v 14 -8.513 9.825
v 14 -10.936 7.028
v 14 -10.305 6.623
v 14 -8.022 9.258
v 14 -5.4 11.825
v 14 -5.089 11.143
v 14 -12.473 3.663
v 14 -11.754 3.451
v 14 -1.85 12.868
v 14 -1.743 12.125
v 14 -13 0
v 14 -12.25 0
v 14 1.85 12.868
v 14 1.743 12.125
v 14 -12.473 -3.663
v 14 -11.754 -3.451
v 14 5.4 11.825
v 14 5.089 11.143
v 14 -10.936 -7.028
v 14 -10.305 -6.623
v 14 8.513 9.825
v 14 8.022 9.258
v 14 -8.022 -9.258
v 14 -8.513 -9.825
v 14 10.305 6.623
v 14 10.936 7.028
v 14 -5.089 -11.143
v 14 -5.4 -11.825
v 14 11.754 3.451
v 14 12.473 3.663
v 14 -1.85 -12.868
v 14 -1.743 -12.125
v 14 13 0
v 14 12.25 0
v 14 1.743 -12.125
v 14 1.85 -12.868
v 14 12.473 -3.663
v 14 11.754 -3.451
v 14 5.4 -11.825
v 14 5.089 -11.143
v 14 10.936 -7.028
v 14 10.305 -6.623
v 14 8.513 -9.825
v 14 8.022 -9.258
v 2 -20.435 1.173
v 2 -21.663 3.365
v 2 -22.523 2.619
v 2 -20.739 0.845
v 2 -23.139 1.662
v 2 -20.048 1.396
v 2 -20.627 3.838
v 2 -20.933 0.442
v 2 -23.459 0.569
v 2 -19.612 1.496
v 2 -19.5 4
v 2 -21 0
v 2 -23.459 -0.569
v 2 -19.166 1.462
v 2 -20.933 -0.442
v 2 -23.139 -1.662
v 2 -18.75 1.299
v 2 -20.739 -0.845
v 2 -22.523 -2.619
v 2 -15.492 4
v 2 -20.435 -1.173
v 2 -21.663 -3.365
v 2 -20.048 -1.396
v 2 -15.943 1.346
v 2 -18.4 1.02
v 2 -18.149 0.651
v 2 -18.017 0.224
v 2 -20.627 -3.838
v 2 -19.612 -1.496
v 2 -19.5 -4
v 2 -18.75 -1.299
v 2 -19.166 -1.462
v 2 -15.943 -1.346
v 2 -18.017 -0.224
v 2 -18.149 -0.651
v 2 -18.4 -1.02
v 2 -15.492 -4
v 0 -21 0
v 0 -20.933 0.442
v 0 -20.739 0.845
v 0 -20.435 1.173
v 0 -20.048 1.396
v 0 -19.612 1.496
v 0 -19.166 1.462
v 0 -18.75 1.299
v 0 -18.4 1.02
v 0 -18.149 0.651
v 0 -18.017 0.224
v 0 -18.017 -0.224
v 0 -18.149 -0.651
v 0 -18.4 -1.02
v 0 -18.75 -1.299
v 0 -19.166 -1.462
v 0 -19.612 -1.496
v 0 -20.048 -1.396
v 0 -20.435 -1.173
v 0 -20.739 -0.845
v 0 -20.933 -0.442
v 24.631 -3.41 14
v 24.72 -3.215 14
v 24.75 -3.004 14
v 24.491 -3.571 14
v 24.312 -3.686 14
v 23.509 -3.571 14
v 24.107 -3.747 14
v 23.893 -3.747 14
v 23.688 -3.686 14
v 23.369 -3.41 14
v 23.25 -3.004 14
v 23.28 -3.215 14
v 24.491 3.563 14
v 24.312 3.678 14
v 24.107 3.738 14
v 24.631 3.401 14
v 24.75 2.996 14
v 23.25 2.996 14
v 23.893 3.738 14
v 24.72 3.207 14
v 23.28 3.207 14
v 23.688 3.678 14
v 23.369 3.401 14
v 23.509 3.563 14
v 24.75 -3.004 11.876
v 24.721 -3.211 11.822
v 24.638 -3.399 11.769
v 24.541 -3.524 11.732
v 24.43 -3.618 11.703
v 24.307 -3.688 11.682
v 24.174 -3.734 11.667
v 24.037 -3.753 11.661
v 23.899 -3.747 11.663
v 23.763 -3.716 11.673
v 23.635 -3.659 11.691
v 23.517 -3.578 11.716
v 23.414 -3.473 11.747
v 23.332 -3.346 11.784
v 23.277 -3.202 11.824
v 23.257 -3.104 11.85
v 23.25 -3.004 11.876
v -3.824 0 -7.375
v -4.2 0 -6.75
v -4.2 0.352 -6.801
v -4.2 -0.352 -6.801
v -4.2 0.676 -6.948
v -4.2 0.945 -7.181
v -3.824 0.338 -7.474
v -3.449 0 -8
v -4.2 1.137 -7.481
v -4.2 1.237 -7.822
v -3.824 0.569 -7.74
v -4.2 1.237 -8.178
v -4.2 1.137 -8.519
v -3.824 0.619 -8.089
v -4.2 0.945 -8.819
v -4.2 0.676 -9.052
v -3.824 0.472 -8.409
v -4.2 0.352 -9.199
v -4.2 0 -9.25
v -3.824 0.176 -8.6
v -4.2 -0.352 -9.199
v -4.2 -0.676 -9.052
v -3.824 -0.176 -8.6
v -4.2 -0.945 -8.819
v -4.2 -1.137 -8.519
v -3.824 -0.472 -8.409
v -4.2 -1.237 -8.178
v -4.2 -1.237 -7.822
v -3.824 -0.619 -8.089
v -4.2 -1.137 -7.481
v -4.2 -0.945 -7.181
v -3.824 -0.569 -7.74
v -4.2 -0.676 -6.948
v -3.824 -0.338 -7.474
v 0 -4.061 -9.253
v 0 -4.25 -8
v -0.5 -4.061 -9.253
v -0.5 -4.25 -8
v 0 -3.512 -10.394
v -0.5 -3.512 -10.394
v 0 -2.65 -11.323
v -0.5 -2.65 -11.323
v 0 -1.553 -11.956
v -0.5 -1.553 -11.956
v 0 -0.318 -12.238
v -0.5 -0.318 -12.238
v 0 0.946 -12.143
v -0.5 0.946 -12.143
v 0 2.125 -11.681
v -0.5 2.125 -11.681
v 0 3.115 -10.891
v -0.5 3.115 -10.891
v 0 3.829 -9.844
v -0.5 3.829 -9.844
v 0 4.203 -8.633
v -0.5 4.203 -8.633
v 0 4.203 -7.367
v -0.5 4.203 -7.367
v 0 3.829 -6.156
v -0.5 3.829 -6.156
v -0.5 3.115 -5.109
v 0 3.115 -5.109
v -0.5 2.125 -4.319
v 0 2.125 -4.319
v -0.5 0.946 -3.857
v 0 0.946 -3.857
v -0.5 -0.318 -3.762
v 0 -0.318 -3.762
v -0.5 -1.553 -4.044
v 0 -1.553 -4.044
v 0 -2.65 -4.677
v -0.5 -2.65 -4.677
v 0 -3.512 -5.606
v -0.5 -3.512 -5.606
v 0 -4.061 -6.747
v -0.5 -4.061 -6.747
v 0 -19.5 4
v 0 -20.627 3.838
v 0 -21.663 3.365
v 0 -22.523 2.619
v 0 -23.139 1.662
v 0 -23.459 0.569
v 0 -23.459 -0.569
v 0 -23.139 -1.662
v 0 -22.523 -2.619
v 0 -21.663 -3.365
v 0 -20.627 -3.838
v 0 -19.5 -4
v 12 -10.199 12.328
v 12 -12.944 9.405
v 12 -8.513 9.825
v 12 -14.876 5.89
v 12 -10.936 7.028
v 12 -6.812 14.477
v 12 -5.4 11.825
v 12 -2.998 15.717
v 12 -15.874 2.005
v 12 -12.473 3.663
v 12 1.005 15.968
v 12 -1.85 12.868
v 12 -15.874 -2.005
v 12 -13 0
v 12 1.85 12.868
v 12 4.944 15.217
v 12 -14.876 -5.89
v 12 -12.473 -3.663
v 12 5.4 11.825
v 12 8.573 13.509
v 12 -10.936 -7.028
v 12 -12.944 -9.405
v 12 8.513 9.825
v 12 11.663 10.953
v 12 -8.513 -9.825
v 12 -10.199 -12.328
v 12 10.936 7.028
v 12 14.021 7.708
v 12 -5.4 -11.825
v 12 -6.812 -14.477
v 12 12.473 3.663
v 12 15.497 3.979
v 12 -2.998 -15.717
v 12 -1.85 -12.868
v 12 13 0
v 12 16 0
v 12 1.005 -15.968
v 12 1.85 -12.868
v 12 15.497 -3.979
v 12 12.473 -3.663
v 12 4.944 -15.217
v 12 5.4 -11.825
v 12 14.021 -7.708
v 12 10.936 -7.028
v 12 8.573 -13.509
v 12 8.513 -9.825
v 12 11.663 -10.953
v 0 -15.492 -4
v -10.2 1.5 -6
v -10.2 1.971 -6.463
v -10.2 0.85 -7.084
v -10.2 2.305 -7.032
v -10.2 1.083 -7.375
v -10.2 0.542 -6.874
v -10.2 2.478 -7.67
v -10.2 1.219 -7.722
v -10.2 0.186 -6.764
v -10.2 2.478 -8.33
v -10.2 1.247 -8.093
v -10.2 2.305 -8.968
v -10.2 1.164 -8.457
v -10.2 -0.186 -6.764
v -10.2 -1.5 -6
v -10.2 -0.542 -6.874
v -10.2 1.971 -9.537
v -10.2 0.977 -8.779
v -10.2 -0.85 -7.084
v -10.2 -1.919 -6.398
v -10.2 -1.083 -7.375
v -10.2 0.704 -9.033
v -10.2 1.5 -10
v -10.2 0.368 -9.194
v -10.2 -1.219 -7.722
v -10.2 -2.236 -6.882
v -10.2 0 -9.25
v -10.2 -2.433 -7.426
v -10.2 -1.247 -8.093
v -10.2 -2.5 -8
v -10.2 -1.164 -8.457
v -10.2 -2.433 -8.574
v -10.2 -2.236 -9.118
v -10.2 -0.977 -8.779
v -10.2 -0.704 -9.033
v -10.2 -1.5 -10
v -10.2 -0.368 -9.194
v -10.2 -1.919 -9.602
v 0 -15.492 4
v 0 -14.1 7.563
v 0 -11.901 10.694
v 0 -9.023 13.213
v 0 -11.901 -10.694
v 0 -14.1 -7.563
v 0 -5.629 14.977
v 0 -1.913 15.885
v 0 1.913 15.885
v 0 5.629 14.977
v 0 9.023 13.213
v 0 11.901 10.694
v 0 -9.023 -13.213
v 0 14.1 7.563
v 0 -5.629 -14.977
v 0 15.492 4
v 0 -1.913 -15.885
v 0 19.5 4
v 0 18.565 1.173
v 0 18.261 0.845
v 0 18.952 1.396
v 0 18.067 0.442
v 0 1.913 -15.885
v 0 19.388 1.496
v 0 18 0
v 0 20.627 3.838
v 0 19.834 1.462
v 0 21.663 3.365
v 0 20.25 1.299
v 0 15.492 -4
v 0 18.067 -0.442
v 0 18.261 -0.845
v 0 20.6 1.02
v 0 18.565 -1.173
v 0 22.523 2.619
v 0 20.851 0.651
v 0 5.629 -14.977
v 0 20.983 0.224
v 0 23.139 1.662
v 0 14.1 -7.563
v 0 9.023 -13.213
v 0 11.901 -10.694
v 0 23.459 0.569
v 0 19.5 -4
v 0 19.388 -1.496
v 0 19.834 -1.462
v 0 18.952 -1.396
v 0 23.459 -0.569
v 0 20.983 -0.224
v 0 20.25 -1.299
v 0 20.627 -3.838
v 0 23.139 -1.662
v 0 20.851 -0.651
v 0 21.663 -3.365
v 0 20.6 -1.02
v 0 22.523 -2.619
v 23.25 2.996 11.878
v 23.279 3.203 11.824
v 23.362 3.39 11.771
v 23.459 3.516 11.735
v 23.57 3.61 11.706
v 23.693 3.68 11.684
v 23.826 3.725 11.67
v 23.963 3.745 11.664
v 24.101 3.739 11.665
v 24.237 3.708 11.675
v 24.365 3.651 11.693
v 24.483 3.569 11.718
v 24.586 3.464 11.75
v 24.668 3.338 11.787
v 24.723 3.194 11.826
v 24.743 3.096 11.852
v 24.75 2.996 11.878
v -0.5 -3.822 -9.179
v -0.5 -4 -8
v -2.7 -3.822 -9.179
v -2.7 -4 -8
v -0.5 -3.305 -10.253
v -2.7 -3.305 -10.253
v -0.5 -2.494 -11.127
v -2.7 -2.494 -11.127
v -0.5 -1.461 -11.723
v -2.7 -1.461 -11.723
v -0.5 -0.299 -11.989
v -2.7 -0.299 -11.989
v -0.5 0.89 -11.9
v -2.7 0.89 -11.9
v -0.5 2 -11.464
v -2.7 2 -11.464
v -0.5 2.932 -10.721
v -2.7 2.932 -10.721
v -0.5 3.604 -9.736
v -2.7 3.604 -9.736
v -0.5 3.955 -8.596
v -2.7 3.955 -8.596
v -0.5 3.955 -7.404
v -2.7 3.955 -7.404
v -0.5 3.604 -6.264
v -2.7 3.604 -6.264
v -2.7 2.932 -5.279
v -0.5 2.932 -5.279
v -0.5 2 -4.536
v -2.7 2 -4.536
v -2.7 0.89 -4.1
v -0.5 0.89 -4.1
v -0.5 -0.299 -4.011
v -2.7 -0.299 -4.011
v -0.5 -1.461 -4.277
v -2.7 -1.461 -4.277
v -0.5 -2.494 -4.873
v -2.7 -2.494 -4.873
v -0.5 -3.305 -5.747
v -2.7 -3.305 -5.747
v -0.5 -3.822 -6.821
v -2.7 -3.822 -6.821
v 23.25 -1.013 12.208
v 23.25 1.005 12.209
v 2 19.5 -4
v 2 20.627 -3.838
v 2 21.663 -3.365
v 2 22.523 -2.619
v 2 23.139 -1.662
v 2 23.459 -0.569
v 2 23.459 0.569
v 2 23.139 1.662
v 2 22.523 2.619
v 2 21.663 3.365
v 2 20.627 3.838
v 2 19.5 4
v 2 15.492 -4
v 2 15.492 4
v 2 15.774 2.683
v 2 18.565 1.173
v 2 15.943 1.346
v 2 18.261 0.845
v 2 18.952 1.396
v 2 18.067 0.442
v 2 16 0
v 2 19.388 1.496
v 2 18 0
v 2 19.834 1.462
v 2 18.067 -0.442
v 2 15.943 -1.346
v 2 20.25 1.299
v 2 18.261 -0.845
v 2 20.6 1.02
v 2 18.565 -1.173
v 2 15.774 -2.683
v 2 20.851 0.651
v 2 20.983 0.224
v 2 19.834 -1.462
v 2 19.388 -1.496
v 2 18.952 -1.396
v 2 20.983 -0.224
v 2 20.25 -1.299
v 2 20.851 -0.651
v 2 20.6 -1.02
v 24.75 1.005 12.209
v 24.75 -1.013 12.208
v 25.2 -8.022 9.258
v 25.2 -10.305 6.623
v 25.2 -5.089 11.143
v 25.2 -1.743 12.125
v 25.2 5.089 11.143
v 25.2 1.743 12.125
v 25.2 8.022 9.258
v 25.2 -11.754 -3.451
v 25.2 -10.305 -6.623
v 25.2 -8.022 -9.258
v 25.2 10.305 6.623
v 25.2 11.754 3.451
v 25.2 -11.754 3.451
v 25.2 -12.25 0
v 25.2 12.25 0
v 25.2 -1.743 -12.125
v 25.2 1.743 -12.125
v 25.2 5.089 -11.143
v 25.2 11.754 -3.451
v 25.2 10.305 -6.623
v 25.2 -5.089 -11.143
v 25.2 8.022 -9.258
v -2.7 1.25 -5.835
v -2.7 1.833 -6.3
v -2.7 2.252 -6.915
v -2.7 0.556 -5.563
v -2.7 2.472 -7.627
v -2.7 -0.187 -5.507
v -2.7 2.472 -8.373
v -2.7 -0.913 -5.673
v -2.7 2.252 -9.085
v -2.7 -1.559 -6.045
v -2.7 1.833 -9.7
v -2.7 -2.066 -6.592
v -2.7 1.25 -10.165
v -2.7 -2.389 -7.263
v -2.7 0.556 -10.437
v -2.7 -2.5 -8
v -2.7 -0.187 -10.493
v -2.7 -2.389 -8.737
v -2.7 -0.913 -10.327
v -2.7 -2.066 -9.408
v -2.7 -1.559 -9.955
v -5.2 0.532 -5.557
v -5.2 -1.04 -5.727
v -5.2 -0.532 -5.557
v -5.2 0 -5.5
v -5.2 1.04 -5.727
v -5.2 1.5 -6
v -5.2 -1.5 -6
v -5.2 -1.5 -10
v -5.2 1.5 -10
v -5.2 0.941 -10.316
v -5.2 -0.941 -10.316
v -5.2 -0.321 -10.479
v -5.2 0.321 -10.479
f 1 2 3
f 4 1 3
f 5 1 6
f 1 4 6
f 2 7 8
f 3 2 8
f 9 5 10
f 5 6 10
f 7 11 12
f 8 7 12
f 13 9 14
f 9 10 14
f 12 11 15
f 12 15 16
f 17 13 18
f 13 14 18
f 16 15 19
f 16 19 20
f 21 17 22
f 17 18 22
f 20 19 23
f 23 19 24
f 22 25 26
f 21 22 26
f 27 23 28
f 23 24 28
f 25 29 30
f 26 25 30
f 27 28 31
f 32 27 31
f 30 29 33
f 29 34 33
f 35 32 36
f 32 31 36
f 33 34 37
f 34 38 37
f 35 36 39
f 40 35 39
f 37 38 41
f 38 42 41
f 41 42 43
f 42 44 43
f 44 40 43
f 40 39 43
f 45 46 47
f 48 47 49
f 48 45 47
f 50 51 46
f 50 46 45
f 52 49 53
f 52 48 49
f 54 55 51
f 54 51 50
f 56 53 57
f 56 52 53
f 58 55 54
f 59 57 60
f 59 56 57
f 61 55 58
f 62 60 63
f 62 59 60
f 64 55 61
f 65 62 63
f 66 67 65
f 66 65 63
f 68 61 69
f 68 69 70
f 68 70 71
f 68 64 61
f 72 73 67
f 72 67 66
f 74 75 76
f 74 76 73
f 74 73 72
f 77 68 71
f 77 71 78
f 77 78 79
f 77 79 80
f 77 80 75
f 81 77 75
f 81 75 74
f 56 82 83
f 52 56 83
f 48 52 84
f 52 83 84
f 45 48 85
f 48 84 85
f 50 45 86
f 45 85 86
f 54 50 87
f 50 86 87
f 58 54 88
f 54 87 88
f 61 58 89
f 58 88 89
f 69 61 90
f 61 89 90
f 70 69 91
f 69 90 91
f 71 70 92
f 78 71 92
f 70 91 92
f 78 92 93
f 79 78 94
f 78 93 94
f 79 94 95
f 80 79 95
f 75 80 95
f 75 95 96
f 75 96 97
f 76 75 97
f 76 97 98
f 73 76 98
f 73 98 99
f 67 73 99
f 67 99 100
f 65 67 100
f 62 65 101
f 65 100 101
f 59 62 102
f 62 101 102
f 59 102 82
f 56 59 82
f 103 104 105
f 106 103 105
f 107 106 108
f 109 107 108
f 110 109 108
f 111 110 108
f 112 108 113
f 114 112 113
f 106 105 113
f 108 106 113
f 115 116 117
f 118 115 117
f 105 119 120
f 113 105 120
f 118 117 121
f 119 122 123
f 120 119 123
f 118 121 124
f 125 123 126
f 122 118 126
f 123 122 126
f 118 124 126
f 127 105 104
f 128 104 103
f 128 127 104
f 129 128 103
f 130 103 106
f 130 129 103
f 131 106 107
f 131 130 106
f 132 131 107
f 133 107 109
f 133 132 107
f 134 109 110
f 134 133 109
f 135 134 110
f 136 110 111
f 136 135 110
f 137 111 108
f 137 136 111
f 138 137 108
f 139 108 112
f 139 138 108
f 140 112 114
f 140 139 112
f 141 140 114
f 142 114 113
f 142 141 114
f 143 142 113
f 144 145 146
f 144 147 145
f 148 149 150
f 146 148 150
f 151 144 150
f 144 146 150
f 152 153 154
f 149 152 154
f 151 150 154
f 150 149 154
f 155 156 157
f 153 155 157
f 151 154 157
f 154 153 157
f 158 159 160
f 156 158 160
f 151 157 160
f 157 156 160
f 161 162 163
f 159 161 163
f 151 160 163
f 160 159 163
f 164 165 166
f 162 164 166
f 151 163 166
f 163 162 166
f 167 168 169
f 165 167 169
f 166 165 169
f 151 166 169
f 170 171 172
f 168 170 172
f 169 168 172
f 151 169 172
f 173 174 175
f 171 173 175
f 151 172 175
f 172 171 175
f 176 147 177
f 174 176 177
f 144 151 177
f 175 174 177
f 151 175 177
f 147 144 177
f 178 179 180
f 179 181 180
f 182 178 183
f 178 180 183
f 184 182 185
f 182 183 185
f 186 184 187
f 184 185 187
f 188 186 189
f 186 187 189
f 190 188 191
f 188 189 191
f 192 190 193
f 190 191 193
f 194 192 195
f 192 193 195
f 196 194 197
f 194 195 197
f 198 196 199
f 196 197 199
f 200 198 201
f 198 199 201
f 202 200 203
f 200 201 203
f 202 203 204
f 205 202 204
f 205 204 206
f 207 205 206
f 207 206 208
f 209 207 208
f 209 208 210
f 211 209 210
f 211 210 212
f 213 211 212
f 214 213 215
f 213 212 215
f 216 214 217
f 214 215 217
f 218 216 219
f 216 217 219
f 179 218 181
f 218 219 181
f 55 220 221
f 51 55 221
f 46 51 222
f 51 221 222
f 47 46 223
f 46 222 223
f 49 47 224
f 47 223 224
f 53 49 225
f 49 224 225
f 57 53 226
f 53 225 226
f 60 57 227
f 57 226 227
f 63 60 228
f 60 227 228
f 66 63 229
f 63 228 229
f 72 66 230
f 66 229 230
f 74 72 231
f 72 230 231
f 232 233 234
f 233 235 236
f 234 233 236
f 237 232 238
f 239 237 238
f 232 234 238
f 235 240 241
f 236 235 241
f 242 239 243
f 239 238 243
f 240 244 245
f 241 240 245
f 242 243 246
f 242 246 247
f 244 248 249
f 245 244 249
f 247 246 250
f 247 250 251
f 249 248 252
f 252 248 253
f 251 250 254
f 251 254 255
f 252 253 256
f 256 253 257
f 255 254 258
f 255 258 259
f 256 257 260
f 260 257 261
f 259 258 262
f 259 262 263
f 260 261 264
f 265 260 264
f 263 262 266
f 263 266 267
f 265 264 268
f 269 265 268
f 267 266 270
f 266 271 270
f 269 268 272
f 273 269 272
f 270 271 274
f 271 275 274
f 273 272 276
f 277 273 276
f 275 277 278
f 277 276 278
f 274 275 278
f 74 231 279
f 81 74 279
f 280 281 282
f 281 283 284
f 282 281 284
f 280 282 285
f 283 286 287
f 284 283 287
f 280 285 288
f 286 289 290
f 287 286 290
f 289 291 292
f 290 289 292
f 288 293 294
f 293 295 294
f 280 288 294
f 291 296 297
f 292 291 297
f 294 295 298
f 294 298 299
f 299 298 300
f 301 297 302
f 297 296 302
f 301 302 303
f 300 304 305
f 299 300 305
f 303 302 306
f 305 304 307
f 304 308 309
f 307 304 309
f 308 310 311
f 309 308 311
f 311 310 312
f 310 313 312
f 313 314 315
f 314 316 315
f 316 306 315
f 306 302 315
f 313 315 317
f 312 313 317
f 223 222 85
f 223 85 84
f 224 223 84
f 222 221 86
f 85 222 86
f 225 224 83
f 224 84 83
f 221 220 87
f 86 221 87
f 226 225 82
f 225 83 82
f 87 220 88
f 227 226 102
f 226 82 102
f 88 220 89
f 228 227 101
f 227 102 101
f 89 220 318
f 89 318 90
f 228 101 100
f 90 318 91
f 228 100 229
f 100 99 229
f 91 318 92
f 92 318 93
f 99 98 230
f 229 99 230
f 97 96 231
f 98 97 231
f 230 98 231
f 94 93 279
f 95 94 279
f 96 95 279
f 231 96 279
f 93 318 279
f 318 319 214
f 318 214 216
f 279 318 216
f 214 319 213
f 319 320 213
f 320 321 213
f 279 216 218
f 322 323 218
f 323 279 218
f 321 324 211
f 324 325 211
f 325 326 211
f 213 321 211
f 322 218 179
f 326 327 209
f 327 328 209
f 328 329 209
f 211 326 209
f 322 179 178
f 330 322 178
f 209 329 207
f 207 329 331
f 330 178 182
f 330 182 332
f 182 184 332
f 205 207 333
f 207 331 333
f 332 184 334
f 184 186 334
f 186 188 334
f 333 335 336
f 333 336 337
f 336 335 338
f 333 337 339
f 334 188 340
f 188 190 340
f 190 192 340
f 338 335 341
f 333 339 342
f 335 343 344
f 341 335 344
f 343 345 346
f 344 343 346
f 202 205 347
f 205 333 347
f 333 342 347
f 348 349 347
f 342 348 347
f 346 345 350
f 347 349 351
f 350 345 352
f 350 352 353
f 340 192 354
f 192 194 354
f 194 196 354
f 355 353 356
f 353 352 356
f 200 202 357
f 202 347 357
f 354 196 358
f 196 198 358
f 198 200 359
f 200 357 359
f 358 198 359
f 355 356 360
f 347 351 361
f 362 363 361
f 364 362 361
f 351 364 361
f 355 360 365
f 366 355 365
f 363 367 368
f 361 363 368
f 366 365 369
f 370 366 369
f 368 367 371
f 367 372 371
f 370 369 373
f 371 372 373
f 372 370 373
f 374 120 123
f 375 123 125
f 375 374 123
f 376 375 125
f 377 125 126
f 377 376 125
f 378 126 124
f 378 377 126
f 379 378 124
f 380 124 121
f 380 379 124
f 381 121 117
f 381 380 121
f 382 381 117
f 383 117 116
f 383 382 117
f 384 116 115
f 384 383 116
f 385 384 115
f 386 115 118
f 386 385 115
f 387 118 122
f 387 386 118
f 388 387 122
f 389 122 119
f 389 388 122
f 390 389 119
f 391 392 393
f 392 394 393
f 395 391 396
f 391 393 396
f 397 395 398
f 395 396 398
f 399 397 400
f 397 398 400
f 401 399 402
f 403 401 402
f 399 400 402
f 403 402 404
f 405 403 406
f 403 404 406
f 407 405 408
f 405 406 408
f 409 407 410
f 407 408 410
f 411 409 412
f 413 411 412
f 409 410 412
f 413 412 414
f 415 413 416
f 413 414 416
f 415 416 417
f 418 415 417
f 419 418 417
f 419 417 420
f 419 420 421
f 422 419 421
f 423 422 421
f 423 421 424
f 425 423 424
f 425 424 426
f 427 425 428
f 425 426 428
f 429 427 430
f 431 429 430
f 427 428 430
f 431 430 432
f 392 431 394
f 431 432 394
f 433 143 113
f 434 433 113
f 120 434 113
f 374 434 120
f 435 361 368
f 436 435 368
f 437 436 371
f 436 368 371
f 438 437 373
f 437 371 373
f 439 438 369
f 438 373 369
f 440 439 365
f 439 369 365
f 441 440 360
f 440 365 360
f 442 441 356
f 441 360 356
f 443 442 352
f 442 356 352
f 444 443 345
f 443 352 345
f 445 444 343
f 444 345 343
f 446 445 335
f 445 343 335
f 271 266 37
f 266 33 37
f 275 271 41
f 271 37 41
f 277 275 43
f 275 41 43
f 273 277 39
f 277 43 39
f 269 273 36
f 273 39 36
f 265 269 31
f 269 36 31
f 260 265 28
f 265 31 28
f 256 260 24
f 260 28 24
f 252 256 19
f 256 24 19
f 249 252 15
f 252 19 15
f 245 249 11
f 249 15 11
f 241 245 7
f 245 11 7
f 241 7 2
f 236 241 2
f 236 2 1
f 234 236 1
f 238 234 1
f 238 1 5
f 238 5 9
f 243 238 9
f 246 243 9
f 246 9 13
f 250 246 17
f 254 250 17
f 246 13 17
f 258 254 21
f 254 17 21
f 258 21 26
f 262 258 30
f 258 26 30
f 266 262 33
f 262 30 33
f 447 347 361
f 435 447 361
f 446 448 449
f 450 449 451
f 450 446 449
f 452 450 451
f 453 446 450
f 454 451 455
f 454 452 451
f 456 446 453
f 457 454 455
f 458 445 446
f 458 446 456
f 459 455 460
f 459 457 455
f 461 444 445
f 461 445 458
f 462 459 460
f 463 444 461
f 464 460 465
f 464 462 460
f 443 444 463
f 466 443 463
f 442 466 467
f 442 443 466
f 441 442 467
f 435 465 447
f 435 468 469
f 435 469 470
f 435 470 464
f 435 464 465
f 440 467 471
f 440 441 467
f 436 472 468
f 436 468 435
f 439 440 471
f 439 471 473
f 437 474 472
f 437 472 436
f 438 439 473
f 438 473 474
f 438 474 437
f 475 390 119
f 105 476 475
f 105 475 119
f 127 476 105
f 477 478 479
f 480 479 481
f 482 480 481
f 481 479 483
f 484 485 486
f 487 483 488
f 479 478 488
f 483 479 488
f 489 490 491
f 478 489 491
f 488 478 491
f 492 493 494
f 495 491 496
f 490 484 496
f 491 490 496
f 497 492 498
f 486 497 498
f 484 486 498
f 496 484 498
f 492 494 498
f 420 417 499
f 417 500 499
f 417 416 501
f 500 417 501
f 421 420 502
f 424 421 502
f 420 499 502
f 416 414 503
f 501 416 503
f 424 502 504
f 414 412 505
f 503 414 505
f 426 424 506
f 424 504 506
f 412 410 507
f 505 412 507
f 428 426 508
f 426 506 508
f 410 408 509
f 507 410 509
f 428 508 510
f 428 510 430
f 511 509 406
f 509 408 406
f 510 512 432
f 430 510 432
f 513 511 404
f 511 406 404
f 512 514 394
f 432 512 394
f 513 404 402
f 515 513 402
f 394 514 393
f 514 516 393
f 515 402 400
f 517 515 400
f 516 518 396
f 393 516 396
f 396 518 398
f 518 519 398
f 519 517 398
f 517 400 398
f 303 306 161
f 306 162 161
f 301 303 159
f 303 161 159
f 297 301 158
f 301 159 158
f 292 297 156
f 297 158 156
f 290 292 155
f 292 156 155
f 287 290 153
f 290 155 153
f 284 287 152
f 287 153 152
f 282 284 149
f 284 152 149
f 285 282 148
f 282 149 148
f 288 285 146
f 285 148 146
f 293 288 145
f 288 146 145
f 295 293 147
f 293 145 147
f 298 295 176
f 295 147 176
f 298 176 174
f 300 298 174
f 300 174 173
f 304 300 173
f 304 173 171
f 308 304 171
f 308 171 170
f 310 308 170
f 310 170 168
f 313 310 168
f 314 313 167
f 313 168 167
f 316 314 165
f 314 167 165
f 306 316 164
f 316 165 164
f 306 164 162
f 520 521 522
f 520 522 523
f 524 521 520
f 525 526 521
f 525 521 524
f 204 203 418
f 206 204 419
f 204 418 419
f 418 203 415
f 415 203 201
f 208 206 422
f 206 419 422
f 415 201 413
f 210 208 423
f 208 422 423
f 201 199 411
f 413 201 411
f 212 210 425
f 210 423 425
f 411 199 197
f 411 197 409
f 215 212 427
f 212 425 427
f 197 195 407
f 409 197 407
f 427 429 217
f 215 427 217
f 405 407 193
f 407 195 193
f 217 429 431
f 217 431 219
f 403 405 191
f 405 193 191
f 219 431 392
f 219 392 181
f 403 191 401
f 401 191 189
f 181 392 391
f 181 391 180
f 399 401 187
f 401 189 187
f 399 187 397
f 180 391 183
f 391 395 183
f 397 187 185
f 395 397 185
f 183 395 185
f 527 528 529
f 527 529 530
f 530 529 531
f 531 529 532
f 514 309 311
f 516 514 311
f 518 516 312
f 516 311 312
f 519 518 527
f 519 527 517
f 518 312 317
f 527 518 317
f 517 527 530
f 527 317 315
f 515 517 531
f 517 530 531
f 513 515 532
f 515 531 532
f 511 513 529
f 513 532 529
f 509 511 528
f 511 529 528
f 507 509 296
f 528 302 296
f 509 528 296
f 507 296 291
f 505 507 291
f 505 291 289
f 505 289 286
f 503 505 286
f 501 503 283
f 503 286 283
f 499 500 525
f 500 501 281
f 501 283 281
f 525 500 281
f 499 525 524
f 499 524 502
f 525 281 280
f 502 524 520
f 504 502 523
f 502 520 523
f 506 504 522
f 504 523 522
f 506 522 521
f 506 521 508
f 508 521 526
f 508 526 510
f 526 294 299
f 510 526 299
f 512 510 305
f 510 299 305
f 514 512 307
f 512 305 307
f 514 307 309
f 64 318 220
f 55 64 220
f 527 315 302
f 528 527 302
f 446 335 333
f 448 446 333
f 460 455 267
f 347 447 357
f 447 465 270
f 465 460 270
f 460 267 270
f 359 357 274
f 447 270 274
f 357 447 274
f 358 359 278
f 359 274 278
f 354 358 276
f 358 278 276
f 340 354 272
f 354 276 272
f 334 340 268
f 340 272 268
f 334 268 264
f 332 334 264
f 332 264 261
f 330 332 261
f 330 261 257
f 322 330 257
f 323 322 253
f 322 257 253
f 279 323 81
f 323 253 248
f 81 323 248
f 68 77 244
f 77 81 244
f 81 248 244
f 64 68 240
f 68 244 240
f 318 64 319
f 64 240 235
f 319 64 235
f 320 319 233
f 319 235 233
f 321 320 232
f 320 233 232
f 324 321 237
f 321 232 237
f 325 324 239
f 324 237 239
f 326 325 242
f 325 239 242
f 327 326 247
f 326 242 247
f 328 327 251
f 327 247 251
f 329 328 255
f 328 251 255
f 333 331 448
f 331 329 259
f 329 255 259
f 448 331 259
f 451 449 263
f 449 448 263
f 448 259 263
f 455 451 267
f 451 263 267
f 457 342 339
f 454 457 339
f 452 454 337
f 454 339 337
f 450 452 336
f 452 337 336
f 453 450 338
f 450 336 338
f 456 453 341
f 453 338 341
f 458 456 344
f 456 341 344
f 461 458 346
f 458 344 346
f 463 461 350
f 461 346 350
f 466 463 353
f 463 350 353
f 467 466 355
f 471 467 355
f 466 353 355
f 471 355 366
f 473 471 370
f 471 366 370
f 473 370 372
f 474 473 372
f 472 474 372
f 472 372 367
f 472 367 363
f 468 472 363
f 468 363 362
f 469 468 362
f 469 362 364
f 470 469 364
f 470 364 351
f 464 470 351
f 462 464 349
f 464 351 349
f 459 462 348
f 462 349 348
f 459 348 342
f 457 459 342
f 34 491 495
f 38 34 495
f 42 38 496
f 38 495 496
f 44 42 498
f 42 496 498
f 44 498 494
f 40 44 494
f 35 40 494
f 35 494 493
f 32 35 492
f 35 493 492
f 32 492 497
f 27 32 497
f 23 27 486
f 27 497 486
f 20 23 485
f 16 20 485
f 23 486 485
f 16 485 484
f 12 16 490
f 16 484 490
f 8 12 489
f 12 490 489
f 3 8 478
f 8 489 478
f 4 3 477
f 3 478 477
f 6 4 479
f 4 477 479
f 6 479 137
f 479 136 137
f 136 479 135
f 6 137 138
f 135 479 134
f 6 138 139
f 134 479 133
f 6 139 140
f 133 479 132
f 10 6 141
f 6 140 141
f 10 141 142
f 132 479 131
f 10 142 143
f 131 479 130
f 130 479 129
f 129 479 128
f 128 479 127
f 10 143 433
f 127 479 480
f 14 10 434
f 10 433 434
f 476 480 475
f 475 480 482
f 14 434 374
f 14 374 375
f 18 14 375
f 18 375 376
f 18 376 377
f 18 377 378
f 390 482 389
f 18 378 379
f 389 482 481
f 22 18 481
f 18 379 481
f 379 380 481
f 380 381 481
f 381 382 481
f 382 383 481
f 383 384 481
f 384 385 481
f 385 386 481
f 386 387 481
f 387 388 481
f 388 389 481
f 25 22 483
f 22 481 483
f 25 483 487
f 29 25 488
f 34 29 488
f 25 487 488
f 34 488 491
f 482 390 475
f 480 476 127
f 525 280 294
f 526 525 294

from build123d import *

# Parameters (mm, degrees)
SKETCH_2_R             = 1.5
EXTRUDE_1_DEPTH        = 2
HOLE_WIZARD_M3_2_D     = 2.5
HOLE_WIZARD_M3_2_DEPTH = 6
HOLE_WIZARD_M3_2_TIP   = 0.751075774
CUT_EXTRUDE_1_DEPTH    = 5
EXTRUDE_2_DEPTH        = 14


with BuildPart() as part:
    # 草图1 → 旋转1 (revolve)
    with BuildSketch(Plane.XY):
        Polygon((0, 0), (0, 16), (12, 16), (12, 13), (14, 13), (14, 12.25), (25.2, 12.25), (25.2, 0), align=None)
    revolve(axis=Axis((25.2, 0, 0), (-1, 0, 0)))

    # 草图2 → 凸台-拉伸1 (add)
    with BuildSketch(Plane.ZY):
        with BuildLine():
            Line((4, 19.5), (4, -19.5))
            ThreePointArc((4, -19.5), (0, -23.5), (-4, -19.5))
            Line((-4, -19.5), (-4, 19.5))
            ThreePointArc((-4, 19.5), (0, 23.5), (4, 19.5))
        make_face()
        with Locations(Location((0, 19.5, 0), (0, 0, 270))):
            Circle(SKETCH_2_R, mode=Mode.SUBTRACT)
        with Locations(Location((0, -19.5, 0), (0, 0, 270))):
            Circle(SKETCH_2_R, mode=Mode.SUBTRACT)
    extrude(amount=-EXTRUDE_1_DEPTH)

    # 草图4 → 旋转2 (revolve)
    with BuildSketch(Plane.XY.offset(-8), mode=Mode.PRIVATE) as revolve_2_sk:
        Polygon((0, 0), (0, 4.25), (-0.5, 4.25), (-0.5, 4), (-2.7, 4), (-2.7, 2.5), (-10.2, 2.5), (-10.2, 0), align=None)
    revolve(revolve_2_sk.sketch.rotate(Axis((-10.2, 0, -8), (1, 0, 0)), 180), axis=Axis((-10.2, 0, -8), (1, 0, 0)))

    # M3 螺纹孔2
    with Locations(Plane.ZY.offset(10.2)):
        with Locations((-8, 0)):
            Hole(HOLE_WIZARD_M3_2_D / 2, depth=HOLE_WIZARD_M3_2_DEPTH)
            with Locations((0, 0, -(HOLE_WIZARD_M3_2_DEPTH + HOLE_WIZARD_M3_2_TIP / 2))):  # 118° drill point
                Cone(0, HOLE_WIZARD_M3_2_D / 2, HOLE_WIZARD_M3_2_TIP, mode=Mode.SUBTRACT)

    # 草图5 → 切除-拉伸1 (cut)
    with BuildSketch(Plane.ZY.offset(10.2)):
        with BuildLine():
            Line((-10, -1.5), (-10, 1.5))
            ThreePointArc((-10, 1.5), (-10.5, 0), (-10, -1.5))
        make_face()
        with BuildLine():
            ThreePointArc((-5.5, 0), (-5.628291755, 0.790569415), (-6, 1.5))
            Line((-6, 1.5), (-6, -1.5))
            ThreePointArc((-6, -1.5), (-5.628291755, -0.790569415), (-5.5, 0))
        make_face()
    extrude(amount=-CUT_EXTRUDE_1_DEPTH, mode=Mode.SUBTRACT)

    # 草图9 → 凸台-拉伸2 (add)
    with BuildSketch(Plane.XY):
        with BuildLine():
            Line((24.75, 2.995850319), (24.75, -3.004149681))
            ThreePointArc((24.75, -3.004149681), (24, -3.754149681), (23.25, -3.004149681))
            Line((23.25, -3.004149681), (23.25, 2.995850319))
            ThreePointArc((23.25, 2.995850319), (24, 3.745850319), (24.75, 2.995850319))
        make_face()
    extrude(amount=EXTRUDE_2_DEPTH)


solid = part.part
